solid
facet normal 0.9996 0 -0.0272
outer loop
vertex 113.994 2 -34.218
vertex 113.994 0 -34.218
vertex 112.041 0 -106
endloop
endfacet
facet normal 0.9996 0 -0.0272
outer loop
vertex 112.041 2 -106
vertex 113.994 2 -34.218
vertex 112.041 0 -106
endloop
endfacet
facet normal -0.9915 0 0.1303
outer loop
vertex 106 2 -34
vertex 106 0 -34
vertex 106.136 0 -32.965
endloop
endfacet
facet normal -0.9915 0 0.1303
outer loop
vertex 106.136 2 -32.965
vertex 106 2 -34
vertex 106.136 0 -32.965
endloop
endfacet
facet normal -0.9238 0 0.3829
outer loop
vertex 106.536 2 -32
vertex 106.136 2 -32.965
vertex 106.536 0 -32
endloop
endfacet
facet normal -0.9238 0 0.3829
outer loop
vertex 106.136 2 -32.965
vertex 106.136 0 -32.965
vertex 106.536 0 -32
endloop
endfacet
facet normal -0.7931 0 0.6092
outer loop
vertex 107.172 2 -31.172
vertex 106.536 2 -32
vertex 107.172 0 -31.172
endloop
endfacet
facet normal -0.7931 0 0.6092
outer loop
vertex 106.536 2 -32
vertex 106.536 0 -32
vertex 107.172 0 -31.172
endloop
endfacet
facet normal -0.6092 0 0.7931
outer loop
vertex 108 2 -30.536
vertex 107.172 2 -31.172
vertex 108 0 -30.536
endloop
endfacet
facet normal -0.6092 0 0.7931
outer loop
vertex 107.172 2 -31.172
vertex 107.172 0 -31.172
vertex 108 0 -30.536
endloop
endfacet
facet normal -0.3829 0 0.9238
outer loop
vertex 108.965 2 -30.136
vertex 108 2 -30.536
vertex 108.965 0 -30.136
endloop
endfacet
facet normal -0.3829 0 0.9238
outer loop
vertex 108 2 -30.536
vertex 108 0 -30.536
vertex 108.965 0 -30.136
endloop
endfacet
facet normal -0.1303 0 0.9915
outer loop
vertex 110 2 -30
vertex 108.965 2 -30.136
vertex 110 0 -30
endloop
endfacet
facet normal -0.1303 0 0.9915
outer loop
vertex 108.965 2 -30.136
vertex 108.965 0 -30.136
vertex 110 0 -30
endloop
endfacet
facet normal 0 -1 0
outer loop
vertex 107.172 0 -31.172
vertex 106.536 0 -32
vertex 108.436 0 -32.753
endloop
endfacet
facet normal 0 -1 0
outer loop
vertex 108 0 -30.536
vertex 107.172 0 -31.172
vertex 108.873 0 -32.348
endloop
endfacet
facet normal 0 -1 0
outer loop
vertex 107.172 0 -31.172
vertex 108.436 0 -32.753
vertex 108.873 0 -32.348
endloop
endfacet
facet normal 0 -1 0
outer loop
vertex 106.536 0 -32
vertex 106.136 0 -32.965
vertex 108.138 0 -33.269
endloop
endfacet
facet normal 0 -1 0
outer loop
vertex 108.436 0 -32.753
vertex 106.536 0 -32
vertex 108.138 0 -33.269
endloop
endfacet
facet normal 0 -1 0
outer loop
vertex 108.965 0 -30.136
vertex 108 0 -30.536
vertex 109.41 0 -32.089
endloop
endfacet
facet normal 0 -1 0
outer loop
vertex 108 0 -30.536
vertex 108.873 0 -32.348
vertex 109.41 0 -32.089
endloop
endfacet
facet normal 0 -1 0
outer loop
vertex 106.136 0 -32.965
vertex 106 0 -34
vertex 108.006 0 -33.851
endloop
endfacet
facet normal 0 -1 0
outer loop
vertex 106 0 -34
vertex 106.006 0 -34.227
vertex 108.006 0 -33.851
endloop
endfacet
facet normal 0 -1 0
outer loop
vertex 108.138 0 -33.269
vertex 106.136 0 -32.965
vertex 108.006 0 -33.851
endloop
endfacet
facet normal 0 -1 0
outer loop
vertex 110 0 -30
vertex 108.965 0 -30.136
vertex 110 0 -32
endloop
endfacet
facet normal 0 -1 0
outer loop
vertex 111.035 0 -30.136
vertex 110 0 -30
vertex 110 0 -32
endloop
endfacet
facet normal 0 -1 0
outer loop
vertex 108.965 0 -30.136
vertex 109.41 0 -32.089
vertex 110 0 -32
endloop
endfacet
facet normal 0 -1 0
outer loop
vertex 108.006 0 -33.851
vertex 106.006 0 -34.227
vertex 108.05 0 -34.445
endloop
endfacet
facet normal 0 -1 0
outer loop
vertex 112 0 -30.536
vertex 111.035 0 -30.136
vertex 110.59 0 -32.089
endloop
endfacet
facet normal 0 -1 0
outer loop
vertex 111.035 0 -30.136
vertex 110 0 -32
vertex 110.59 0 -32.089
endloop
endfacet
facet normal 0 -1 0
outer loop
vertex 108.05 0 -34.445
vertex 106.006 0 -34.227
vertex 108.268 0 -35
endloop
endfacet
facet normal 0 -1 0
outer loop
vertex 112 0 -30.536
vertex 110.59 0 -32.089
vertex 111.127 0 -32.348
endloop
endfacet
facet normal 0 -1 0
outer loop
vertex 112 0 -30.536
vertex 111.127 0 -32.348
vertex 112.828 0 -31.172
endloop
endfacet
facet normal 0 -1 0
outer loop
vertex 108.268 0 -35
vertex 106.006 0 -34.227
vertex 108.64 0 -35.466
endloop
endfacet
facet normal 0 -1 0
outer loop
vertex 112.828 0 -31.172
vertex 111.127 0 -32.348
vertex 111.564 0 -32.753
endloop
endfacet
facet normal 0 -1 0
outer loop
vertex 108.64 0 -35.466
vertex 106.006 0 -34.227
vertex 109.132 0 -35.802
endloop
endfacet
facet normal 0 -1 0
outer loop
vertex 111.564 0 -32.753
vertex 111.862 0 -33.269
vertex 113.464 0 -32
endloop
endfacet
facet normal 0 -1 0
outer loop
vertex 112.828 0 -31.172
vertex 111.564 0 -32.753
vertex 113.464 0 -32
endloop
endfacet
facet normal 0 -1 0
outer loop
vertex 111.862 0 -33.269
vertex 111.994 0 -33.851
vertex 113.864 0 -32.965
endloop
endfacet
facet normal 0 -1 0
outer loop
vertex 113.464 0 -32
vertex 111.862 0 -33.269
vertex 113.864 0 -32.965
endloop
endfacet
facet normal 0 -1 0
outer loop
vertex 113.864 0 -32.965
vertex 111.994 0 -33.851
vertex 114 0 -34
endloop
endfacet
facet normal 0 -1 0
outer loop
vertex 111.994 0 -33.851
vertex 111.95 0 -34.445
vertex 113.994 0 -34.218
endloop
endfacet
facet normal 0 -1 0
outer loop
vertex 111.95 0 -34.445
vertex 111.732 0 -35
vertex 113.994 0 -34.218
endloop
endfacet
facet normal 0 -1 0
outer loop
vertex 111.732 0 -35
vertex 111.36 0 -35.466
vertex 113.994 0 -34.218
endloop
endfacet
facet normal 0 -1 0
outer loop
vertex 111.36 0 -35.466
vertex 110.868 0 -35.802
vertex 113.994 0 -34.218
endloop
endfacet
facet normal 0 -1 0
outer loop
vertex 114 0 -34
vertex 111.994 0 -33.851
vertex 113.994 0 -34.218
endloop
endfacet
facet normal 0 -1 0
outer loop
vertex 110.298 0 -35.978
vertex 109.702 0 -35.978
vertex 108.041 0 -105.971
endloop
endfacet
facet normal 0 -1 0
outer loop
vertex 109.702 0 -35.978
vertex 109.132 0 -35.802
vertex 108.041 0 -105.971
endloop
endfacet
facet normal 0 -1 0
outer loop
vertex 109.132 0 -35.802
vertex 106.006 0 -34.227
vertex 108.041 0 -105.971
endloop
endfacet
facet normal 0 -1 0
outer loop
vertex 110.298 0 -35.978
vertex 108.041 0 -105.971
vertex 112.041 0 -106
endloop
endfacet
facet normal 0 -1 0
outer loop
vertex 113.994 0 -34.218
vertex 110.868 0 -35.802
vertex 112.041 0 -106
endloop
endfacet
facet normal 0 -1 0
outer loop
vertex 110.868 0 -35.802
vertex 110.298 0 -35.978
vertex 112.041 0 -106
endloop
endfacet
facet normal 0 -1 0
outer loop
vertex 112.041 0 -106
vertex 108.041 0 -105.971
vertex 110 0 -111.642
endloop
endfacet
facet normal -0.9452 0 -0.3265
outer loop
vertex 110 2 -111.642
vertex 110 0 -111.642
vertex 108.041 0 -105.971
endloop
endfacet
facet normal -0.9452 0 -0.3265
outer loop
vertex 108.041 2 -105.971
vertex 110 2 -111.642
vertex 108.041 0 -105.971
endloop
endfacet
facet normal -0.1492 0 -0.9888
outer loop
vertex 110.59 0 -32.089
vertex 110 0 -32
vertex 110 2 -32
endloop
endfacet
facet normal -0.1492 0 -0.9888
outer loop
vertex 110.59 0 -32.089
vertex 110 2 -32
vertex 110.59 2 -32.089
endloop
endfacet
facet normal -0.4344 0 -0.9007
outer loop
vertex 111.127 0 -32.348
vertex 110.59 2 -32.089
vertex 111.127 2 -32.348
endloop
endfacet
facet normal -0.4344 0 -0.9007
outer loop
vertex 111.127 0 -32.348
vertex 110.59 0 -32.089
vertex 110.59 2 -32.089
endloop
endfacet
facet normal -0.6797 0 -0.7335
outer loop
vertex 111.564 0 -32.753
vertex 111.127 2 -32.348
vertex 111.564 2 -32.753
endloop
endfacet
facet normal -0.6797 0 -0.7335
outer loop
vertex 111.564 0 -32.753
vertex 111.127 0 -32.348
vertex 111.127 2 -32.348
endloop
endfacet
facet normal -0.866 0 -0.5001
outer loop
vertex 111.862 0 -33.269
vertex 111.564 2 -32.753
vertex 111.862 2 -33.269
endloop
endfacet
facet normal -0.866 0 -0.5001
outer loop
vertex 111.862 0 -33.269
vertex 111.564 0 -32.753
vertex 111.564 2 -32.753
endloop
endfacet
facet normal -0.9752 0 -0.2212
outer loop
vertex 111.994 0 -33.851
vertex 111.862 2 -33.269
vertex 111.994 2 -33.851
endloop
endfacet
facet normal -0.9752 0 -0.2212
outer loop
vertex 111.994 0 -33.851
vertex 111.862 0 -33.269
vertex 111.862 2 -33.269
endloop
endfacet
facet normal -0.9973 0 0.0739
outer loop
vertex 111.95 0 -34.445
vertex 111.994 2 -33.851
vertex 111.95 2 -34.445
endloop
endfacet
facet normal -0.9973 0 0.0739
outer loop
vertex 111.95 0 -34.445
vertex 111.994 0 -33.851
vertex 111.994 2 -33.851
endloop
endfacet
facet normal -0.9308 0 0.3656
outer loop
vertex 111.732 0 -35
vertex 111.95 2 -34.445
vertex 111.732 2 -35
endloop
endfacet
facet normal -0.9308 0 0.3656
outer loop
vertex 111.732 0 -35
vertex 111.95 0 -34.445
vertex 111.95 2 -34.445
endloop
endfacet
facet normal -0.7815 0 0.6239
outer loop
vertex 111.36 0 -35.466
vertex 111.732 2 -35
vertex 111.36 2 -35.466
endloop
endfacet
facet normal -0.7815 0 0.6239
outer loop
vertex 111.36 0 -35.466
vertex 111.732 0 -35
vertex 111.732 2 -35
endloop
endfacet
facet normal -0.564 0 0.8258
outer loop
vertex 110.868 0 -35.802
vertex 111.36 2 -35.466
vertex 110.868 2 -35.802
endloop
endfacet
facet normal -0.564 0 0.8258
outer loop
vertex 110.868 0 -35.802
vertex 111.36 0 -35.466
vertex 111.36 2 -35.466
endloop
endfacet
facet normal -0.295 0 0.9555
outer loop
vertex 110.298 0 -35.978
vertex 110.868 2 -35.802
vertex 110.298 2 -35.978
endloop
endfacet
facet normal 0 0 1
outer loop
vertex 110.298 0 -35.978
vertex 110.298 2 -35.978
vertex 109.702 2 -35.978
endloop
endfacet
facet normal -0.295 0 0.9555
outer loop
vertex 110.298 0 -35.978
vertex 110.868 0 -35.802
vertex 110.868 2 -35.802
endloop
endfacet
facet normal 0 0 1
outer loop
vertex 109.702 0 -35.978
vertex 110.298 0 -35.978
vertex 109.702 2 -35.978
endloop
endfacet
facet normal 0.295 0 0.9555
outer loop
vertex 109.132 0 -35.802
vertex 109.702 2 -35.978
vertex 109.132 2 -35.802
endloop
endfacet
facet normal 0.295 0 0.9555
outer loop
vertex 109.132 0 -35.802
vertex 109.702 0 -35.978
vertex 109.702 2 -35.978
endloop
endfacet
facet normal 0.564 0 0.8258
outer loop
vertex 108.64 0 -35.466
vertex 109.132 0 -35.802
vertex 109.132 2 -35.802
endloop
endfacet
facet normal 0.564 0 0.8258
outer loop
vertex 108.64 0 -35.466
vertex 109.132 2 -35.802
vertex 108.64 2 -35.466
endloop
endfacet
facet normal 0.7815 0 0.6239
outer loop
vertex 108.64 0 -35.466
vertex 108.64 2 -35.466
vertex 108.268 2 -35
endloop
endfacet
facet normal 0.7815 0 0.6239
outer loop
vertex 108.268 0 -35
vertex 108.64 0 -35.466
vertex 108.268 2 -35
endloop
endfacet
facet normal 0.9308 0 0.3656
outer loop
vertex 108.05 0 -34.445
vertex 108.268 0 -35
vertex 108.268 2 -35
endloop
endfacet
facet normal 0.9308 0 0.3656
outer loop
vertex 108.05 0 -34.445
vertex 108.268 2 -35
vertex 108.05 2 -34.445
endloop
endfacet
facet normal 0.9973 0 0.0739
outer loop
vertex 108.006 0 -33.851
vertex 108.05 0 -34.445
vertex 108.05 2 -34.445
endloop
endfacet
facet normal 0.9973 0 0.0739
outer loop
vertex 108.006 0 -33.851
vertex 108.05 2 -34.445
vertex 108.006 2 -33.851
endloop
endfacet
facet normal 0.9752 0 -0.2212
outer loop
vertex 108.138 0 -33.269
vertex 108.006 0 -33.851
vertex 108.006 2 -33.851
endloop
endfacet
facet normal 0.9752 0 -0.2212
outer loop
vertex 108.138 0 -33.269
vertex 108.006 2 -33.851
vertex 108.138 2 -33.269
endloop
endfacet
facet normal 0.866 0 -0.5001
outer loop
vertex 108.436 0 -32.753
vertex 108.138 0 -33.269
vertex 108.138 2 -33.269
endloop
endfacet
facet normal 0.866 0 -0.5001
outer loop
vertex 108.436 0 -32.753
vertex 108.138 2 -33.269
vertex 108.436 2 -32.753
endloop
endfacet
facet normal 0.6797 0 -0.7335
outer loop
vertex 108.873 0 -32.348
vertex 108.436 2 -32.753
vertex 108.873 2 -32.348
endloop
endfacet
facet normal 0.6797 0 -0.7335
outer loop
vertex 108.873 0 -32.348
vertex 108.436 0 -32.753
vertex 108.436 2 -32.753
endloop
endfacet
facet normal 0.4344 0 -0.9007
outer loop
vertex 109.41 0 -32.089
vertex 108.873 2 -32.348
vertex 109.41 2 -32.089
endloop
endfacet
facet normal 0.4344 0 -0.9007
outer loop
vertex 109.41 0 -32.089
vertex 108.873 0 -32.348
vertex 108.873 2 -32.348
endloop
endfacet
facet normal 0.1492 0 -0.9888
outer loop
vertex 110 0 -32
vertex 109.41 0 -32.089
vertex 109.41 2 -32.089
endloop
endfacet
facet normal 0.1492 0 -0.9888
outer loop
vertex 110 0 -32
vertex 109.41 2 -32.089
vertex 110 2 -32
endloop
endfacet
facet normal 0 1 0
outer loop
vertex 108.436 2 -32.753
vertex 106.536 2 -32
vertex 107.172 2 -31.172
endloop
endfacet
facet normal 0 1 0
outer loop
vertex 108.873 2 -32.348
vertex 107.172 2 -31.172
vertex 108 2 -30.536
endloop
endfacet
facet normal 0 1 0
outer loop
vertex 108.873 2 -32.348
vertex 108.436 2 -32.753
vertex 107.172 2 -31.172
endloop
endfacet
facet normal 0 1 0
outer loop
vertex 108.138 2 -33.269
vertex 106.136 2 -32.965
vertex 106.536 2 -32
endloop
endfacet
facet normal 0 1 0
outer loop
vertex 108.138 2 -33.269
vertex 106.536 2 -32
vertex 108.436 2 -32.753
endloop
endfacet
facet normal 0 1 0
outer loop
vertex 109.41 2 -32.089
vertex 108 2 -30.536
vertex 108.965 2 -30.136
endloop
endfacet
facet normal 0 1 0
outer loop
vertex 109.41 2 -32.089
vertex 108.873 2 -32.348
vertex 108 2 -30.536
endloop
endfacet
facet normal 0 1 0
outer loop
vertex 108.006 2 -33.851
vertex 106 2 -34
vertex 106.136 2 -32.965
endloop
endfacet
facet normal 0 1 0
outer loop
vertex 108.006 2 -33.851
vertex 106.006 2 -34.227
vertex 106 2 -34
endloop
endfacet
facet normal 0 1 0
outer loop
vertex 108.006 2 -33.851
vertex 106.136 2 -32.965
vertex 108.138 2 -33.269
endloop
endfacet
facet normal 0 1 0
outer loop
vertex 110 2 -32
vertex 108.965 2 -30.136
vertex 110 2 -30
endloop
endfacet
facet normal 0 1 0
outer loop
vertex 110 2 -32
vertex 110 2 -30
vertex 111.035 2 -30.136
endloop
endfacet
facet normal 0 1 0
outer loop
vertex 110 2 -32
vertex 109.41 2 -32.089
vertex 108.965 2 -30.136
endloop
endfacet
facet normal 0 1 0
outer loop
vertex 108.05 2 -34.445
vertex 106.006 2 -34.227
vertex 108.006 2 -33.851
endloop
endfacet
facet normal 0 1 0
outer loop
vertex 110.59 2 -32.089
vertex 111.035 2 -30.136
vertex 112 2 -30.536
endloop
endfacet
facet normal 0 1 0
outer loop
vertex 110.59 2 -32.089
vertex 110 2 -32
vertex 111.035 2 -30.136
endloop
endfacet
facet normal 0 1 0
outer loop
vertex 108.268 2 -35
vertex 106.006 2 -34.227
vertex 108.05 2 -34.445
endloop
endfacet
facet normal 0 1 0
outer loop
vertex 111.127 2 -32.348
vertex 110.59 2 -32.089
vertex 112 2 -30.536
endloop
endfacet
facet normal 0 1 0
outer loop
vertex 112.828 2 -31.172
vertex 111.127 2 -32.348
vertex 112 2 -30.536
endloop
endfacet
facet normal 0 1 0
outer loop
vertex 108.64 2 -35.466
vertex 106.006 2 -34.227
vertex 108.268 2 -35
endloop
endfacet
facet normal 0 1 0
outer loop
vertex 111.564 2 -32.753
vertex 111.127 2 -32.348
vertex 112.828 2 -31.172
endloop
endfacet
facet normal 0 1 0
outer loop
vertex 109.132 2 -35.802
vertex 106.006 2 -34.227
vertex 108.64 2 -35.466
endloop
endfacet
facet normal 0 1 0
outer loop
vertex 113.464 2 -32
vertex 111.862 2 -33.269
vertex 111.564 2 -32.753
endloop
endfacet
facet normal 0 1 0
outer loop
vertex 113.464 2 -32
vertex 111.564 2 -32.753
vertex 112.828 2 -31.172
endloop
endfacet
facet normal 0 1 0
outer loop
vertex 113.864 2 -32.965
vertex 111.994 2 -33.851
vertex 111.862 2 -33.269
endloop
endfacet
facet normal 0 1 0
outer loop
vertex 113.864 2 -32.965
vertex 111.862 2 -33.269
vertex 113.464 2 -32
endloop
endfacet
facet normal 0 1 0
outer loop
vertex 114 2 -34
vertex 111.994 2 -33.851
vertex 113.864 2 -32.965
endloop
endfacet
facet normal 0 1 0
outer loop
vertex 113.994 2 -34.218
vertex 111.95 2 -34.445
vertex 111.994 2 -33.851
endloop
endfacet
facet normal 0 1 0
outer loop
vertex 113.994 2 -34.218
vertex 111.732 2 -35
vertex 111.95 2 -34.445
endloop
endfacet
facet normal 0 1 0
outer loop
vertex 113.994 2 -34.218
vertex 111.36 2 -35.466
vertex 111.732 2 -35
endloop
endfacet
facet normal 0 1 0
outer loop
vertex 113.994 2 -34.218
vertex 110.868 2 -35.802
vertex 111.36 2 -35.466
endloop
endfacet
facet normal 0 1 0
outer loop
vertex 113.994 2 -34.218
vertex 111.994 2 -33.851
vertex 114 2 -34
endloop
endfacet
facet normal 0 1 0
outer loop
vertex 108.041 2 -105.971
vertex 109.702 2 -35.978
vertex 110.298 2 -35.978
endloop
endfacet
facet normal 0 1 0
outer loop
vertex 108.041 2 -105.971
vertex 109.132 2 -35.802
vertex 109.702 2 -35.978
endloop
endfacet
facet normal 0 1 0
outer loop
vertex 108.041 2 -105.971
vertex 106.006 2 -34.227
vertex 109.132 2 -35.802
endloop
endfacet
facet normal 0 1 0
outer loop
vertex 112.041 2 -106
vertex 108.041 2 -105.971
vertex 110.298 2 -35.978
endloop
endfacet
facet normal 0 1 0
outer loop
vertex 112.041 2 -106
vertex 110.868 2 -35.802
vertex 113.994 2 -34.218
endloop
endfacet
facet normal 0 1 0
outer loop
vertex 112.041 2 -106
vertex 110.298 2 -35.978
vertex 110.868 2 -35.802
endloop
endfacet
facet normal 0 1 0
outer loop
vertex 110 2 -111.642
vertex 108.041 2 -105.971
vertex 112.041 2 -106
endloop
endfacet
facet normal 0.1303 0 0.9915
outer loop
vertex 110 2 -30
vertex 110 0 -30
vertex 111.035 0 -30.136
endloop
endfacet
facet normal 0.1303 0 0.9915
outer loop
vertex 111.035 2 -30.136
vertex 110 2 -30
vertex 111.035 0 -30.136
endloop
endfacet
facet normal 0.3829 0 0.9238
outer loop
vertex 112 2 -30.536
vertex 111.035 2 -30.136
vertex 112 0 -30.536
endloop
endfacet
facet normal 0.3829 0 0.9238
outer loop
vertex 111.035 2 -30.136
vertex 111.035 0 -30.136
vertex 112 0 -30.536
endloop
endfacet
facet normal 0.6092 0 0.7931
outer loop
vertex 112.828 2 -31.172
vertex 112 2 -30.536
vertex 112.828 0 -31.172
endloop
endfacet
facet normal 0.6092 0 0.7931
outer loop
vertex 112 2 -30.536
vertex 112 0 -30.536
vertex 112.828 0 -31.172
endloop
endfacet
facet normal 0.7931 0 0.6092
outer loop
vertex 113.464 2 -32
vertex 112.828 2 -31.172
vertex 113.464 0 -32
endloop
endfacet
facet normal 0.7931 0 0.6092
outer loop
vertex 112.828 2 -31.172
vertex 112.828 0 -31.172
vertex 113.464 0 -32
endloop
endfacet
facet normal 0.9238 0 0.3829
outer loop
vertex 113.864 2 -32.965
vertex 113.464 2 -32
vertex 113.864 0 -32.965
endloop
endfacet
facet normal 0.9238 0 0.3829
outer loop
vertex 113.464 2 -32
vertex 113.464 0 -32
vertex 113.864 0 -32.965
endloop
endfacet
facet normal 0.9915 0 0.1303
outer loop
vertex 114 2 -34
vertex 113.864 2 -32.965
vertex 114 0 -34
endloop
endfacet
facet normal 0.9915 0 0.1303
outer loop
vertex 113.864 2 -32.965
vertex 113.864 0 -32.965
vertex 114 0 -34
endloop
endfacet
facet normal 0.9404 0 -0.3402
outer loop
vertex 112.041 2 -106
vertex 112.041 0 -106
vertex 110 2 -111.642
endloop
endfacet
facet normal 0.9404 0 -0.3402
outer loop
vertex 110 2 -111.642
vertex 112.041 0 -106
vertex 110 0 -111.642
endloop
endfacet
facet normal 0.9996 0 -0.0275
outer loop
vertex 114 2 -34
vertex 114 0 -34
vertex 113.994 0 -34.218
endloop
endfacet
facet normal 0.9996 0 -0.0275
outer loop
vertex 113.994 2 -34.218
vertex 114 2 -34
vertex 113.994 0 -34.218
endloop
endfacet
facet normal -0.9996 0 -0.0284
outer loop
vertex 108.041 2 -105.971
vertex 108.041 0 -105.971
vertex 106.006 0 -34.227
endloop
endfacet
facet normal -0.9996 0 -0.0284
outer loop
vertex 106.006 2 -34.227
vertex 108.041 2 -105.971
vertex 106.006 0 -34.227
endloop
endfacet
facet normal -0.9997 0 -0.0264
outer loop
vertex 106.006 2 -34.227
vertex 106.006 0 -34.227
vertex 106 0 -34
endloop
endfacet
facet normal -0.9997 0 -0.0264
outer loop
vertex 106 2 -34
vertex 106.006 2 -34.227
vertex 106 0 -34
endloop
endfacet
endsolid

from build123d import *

# Parameters (mm, degrees)
SKICA1_R                = 2
P_IDAT_VYSUNUT_M3_DEPTH = 2


with BuildPart() as part:
    # Skica1 → Přidat vysunutím3 (new body)
    # profile 1 of 2: a face of its own
    with BuildSketch(Plane(origin=(0, 0, 0), x_dir=(1, 0, 0), z_dir=(0, 1, 0))):
        with BuildLine():
            Line((108.040914438, 105.971068272), (106.006427981, 34.226677149))
            ThreePointArc((106.006427981, 34.226677149), (110.004588085, 37.999997369), (113.994081517, 34.217515135))
            Line((113.994081517, 34.217515135), (112.040914438, 106))
            Line((112.040914438, 106), (110, 111.642221926))
            Line((110, 111.642221926), (108.040914438, 105.971068272))
        make_face()
    # profile 2 of 2: a face of its own
    with BuildSketch(Plane(origin=(0, 0, 0), x_dir=(1, 0, 0), z_dir=(0, 1, 0))):
        with BuildLine():
            ThreePointArc((106, 34), (107.171572875, 31.171572875), (110, 30))
            ThreePointArc((110, 30), (112.828427125, 31.171572875), (114, 34))
            Line((114, 34), (113.994081517, 34.217515135))
            ThreePointArc((113.994081517, 34.217515135), (110.004588085, 37.999997369), (106.006427981, 34.226677149))
            Line((106.006427981, 34.226677149), (106, 34))
        make_face()
        with Locations(Location((110, 34, 0), (0, 0, 270))):
            Circle(SKICA1_R, mode=Mode.SUBTRACT)
    extrude(amount=P_IDAT_VYSUNUT_M3_DEPTH)


solid = part.part
